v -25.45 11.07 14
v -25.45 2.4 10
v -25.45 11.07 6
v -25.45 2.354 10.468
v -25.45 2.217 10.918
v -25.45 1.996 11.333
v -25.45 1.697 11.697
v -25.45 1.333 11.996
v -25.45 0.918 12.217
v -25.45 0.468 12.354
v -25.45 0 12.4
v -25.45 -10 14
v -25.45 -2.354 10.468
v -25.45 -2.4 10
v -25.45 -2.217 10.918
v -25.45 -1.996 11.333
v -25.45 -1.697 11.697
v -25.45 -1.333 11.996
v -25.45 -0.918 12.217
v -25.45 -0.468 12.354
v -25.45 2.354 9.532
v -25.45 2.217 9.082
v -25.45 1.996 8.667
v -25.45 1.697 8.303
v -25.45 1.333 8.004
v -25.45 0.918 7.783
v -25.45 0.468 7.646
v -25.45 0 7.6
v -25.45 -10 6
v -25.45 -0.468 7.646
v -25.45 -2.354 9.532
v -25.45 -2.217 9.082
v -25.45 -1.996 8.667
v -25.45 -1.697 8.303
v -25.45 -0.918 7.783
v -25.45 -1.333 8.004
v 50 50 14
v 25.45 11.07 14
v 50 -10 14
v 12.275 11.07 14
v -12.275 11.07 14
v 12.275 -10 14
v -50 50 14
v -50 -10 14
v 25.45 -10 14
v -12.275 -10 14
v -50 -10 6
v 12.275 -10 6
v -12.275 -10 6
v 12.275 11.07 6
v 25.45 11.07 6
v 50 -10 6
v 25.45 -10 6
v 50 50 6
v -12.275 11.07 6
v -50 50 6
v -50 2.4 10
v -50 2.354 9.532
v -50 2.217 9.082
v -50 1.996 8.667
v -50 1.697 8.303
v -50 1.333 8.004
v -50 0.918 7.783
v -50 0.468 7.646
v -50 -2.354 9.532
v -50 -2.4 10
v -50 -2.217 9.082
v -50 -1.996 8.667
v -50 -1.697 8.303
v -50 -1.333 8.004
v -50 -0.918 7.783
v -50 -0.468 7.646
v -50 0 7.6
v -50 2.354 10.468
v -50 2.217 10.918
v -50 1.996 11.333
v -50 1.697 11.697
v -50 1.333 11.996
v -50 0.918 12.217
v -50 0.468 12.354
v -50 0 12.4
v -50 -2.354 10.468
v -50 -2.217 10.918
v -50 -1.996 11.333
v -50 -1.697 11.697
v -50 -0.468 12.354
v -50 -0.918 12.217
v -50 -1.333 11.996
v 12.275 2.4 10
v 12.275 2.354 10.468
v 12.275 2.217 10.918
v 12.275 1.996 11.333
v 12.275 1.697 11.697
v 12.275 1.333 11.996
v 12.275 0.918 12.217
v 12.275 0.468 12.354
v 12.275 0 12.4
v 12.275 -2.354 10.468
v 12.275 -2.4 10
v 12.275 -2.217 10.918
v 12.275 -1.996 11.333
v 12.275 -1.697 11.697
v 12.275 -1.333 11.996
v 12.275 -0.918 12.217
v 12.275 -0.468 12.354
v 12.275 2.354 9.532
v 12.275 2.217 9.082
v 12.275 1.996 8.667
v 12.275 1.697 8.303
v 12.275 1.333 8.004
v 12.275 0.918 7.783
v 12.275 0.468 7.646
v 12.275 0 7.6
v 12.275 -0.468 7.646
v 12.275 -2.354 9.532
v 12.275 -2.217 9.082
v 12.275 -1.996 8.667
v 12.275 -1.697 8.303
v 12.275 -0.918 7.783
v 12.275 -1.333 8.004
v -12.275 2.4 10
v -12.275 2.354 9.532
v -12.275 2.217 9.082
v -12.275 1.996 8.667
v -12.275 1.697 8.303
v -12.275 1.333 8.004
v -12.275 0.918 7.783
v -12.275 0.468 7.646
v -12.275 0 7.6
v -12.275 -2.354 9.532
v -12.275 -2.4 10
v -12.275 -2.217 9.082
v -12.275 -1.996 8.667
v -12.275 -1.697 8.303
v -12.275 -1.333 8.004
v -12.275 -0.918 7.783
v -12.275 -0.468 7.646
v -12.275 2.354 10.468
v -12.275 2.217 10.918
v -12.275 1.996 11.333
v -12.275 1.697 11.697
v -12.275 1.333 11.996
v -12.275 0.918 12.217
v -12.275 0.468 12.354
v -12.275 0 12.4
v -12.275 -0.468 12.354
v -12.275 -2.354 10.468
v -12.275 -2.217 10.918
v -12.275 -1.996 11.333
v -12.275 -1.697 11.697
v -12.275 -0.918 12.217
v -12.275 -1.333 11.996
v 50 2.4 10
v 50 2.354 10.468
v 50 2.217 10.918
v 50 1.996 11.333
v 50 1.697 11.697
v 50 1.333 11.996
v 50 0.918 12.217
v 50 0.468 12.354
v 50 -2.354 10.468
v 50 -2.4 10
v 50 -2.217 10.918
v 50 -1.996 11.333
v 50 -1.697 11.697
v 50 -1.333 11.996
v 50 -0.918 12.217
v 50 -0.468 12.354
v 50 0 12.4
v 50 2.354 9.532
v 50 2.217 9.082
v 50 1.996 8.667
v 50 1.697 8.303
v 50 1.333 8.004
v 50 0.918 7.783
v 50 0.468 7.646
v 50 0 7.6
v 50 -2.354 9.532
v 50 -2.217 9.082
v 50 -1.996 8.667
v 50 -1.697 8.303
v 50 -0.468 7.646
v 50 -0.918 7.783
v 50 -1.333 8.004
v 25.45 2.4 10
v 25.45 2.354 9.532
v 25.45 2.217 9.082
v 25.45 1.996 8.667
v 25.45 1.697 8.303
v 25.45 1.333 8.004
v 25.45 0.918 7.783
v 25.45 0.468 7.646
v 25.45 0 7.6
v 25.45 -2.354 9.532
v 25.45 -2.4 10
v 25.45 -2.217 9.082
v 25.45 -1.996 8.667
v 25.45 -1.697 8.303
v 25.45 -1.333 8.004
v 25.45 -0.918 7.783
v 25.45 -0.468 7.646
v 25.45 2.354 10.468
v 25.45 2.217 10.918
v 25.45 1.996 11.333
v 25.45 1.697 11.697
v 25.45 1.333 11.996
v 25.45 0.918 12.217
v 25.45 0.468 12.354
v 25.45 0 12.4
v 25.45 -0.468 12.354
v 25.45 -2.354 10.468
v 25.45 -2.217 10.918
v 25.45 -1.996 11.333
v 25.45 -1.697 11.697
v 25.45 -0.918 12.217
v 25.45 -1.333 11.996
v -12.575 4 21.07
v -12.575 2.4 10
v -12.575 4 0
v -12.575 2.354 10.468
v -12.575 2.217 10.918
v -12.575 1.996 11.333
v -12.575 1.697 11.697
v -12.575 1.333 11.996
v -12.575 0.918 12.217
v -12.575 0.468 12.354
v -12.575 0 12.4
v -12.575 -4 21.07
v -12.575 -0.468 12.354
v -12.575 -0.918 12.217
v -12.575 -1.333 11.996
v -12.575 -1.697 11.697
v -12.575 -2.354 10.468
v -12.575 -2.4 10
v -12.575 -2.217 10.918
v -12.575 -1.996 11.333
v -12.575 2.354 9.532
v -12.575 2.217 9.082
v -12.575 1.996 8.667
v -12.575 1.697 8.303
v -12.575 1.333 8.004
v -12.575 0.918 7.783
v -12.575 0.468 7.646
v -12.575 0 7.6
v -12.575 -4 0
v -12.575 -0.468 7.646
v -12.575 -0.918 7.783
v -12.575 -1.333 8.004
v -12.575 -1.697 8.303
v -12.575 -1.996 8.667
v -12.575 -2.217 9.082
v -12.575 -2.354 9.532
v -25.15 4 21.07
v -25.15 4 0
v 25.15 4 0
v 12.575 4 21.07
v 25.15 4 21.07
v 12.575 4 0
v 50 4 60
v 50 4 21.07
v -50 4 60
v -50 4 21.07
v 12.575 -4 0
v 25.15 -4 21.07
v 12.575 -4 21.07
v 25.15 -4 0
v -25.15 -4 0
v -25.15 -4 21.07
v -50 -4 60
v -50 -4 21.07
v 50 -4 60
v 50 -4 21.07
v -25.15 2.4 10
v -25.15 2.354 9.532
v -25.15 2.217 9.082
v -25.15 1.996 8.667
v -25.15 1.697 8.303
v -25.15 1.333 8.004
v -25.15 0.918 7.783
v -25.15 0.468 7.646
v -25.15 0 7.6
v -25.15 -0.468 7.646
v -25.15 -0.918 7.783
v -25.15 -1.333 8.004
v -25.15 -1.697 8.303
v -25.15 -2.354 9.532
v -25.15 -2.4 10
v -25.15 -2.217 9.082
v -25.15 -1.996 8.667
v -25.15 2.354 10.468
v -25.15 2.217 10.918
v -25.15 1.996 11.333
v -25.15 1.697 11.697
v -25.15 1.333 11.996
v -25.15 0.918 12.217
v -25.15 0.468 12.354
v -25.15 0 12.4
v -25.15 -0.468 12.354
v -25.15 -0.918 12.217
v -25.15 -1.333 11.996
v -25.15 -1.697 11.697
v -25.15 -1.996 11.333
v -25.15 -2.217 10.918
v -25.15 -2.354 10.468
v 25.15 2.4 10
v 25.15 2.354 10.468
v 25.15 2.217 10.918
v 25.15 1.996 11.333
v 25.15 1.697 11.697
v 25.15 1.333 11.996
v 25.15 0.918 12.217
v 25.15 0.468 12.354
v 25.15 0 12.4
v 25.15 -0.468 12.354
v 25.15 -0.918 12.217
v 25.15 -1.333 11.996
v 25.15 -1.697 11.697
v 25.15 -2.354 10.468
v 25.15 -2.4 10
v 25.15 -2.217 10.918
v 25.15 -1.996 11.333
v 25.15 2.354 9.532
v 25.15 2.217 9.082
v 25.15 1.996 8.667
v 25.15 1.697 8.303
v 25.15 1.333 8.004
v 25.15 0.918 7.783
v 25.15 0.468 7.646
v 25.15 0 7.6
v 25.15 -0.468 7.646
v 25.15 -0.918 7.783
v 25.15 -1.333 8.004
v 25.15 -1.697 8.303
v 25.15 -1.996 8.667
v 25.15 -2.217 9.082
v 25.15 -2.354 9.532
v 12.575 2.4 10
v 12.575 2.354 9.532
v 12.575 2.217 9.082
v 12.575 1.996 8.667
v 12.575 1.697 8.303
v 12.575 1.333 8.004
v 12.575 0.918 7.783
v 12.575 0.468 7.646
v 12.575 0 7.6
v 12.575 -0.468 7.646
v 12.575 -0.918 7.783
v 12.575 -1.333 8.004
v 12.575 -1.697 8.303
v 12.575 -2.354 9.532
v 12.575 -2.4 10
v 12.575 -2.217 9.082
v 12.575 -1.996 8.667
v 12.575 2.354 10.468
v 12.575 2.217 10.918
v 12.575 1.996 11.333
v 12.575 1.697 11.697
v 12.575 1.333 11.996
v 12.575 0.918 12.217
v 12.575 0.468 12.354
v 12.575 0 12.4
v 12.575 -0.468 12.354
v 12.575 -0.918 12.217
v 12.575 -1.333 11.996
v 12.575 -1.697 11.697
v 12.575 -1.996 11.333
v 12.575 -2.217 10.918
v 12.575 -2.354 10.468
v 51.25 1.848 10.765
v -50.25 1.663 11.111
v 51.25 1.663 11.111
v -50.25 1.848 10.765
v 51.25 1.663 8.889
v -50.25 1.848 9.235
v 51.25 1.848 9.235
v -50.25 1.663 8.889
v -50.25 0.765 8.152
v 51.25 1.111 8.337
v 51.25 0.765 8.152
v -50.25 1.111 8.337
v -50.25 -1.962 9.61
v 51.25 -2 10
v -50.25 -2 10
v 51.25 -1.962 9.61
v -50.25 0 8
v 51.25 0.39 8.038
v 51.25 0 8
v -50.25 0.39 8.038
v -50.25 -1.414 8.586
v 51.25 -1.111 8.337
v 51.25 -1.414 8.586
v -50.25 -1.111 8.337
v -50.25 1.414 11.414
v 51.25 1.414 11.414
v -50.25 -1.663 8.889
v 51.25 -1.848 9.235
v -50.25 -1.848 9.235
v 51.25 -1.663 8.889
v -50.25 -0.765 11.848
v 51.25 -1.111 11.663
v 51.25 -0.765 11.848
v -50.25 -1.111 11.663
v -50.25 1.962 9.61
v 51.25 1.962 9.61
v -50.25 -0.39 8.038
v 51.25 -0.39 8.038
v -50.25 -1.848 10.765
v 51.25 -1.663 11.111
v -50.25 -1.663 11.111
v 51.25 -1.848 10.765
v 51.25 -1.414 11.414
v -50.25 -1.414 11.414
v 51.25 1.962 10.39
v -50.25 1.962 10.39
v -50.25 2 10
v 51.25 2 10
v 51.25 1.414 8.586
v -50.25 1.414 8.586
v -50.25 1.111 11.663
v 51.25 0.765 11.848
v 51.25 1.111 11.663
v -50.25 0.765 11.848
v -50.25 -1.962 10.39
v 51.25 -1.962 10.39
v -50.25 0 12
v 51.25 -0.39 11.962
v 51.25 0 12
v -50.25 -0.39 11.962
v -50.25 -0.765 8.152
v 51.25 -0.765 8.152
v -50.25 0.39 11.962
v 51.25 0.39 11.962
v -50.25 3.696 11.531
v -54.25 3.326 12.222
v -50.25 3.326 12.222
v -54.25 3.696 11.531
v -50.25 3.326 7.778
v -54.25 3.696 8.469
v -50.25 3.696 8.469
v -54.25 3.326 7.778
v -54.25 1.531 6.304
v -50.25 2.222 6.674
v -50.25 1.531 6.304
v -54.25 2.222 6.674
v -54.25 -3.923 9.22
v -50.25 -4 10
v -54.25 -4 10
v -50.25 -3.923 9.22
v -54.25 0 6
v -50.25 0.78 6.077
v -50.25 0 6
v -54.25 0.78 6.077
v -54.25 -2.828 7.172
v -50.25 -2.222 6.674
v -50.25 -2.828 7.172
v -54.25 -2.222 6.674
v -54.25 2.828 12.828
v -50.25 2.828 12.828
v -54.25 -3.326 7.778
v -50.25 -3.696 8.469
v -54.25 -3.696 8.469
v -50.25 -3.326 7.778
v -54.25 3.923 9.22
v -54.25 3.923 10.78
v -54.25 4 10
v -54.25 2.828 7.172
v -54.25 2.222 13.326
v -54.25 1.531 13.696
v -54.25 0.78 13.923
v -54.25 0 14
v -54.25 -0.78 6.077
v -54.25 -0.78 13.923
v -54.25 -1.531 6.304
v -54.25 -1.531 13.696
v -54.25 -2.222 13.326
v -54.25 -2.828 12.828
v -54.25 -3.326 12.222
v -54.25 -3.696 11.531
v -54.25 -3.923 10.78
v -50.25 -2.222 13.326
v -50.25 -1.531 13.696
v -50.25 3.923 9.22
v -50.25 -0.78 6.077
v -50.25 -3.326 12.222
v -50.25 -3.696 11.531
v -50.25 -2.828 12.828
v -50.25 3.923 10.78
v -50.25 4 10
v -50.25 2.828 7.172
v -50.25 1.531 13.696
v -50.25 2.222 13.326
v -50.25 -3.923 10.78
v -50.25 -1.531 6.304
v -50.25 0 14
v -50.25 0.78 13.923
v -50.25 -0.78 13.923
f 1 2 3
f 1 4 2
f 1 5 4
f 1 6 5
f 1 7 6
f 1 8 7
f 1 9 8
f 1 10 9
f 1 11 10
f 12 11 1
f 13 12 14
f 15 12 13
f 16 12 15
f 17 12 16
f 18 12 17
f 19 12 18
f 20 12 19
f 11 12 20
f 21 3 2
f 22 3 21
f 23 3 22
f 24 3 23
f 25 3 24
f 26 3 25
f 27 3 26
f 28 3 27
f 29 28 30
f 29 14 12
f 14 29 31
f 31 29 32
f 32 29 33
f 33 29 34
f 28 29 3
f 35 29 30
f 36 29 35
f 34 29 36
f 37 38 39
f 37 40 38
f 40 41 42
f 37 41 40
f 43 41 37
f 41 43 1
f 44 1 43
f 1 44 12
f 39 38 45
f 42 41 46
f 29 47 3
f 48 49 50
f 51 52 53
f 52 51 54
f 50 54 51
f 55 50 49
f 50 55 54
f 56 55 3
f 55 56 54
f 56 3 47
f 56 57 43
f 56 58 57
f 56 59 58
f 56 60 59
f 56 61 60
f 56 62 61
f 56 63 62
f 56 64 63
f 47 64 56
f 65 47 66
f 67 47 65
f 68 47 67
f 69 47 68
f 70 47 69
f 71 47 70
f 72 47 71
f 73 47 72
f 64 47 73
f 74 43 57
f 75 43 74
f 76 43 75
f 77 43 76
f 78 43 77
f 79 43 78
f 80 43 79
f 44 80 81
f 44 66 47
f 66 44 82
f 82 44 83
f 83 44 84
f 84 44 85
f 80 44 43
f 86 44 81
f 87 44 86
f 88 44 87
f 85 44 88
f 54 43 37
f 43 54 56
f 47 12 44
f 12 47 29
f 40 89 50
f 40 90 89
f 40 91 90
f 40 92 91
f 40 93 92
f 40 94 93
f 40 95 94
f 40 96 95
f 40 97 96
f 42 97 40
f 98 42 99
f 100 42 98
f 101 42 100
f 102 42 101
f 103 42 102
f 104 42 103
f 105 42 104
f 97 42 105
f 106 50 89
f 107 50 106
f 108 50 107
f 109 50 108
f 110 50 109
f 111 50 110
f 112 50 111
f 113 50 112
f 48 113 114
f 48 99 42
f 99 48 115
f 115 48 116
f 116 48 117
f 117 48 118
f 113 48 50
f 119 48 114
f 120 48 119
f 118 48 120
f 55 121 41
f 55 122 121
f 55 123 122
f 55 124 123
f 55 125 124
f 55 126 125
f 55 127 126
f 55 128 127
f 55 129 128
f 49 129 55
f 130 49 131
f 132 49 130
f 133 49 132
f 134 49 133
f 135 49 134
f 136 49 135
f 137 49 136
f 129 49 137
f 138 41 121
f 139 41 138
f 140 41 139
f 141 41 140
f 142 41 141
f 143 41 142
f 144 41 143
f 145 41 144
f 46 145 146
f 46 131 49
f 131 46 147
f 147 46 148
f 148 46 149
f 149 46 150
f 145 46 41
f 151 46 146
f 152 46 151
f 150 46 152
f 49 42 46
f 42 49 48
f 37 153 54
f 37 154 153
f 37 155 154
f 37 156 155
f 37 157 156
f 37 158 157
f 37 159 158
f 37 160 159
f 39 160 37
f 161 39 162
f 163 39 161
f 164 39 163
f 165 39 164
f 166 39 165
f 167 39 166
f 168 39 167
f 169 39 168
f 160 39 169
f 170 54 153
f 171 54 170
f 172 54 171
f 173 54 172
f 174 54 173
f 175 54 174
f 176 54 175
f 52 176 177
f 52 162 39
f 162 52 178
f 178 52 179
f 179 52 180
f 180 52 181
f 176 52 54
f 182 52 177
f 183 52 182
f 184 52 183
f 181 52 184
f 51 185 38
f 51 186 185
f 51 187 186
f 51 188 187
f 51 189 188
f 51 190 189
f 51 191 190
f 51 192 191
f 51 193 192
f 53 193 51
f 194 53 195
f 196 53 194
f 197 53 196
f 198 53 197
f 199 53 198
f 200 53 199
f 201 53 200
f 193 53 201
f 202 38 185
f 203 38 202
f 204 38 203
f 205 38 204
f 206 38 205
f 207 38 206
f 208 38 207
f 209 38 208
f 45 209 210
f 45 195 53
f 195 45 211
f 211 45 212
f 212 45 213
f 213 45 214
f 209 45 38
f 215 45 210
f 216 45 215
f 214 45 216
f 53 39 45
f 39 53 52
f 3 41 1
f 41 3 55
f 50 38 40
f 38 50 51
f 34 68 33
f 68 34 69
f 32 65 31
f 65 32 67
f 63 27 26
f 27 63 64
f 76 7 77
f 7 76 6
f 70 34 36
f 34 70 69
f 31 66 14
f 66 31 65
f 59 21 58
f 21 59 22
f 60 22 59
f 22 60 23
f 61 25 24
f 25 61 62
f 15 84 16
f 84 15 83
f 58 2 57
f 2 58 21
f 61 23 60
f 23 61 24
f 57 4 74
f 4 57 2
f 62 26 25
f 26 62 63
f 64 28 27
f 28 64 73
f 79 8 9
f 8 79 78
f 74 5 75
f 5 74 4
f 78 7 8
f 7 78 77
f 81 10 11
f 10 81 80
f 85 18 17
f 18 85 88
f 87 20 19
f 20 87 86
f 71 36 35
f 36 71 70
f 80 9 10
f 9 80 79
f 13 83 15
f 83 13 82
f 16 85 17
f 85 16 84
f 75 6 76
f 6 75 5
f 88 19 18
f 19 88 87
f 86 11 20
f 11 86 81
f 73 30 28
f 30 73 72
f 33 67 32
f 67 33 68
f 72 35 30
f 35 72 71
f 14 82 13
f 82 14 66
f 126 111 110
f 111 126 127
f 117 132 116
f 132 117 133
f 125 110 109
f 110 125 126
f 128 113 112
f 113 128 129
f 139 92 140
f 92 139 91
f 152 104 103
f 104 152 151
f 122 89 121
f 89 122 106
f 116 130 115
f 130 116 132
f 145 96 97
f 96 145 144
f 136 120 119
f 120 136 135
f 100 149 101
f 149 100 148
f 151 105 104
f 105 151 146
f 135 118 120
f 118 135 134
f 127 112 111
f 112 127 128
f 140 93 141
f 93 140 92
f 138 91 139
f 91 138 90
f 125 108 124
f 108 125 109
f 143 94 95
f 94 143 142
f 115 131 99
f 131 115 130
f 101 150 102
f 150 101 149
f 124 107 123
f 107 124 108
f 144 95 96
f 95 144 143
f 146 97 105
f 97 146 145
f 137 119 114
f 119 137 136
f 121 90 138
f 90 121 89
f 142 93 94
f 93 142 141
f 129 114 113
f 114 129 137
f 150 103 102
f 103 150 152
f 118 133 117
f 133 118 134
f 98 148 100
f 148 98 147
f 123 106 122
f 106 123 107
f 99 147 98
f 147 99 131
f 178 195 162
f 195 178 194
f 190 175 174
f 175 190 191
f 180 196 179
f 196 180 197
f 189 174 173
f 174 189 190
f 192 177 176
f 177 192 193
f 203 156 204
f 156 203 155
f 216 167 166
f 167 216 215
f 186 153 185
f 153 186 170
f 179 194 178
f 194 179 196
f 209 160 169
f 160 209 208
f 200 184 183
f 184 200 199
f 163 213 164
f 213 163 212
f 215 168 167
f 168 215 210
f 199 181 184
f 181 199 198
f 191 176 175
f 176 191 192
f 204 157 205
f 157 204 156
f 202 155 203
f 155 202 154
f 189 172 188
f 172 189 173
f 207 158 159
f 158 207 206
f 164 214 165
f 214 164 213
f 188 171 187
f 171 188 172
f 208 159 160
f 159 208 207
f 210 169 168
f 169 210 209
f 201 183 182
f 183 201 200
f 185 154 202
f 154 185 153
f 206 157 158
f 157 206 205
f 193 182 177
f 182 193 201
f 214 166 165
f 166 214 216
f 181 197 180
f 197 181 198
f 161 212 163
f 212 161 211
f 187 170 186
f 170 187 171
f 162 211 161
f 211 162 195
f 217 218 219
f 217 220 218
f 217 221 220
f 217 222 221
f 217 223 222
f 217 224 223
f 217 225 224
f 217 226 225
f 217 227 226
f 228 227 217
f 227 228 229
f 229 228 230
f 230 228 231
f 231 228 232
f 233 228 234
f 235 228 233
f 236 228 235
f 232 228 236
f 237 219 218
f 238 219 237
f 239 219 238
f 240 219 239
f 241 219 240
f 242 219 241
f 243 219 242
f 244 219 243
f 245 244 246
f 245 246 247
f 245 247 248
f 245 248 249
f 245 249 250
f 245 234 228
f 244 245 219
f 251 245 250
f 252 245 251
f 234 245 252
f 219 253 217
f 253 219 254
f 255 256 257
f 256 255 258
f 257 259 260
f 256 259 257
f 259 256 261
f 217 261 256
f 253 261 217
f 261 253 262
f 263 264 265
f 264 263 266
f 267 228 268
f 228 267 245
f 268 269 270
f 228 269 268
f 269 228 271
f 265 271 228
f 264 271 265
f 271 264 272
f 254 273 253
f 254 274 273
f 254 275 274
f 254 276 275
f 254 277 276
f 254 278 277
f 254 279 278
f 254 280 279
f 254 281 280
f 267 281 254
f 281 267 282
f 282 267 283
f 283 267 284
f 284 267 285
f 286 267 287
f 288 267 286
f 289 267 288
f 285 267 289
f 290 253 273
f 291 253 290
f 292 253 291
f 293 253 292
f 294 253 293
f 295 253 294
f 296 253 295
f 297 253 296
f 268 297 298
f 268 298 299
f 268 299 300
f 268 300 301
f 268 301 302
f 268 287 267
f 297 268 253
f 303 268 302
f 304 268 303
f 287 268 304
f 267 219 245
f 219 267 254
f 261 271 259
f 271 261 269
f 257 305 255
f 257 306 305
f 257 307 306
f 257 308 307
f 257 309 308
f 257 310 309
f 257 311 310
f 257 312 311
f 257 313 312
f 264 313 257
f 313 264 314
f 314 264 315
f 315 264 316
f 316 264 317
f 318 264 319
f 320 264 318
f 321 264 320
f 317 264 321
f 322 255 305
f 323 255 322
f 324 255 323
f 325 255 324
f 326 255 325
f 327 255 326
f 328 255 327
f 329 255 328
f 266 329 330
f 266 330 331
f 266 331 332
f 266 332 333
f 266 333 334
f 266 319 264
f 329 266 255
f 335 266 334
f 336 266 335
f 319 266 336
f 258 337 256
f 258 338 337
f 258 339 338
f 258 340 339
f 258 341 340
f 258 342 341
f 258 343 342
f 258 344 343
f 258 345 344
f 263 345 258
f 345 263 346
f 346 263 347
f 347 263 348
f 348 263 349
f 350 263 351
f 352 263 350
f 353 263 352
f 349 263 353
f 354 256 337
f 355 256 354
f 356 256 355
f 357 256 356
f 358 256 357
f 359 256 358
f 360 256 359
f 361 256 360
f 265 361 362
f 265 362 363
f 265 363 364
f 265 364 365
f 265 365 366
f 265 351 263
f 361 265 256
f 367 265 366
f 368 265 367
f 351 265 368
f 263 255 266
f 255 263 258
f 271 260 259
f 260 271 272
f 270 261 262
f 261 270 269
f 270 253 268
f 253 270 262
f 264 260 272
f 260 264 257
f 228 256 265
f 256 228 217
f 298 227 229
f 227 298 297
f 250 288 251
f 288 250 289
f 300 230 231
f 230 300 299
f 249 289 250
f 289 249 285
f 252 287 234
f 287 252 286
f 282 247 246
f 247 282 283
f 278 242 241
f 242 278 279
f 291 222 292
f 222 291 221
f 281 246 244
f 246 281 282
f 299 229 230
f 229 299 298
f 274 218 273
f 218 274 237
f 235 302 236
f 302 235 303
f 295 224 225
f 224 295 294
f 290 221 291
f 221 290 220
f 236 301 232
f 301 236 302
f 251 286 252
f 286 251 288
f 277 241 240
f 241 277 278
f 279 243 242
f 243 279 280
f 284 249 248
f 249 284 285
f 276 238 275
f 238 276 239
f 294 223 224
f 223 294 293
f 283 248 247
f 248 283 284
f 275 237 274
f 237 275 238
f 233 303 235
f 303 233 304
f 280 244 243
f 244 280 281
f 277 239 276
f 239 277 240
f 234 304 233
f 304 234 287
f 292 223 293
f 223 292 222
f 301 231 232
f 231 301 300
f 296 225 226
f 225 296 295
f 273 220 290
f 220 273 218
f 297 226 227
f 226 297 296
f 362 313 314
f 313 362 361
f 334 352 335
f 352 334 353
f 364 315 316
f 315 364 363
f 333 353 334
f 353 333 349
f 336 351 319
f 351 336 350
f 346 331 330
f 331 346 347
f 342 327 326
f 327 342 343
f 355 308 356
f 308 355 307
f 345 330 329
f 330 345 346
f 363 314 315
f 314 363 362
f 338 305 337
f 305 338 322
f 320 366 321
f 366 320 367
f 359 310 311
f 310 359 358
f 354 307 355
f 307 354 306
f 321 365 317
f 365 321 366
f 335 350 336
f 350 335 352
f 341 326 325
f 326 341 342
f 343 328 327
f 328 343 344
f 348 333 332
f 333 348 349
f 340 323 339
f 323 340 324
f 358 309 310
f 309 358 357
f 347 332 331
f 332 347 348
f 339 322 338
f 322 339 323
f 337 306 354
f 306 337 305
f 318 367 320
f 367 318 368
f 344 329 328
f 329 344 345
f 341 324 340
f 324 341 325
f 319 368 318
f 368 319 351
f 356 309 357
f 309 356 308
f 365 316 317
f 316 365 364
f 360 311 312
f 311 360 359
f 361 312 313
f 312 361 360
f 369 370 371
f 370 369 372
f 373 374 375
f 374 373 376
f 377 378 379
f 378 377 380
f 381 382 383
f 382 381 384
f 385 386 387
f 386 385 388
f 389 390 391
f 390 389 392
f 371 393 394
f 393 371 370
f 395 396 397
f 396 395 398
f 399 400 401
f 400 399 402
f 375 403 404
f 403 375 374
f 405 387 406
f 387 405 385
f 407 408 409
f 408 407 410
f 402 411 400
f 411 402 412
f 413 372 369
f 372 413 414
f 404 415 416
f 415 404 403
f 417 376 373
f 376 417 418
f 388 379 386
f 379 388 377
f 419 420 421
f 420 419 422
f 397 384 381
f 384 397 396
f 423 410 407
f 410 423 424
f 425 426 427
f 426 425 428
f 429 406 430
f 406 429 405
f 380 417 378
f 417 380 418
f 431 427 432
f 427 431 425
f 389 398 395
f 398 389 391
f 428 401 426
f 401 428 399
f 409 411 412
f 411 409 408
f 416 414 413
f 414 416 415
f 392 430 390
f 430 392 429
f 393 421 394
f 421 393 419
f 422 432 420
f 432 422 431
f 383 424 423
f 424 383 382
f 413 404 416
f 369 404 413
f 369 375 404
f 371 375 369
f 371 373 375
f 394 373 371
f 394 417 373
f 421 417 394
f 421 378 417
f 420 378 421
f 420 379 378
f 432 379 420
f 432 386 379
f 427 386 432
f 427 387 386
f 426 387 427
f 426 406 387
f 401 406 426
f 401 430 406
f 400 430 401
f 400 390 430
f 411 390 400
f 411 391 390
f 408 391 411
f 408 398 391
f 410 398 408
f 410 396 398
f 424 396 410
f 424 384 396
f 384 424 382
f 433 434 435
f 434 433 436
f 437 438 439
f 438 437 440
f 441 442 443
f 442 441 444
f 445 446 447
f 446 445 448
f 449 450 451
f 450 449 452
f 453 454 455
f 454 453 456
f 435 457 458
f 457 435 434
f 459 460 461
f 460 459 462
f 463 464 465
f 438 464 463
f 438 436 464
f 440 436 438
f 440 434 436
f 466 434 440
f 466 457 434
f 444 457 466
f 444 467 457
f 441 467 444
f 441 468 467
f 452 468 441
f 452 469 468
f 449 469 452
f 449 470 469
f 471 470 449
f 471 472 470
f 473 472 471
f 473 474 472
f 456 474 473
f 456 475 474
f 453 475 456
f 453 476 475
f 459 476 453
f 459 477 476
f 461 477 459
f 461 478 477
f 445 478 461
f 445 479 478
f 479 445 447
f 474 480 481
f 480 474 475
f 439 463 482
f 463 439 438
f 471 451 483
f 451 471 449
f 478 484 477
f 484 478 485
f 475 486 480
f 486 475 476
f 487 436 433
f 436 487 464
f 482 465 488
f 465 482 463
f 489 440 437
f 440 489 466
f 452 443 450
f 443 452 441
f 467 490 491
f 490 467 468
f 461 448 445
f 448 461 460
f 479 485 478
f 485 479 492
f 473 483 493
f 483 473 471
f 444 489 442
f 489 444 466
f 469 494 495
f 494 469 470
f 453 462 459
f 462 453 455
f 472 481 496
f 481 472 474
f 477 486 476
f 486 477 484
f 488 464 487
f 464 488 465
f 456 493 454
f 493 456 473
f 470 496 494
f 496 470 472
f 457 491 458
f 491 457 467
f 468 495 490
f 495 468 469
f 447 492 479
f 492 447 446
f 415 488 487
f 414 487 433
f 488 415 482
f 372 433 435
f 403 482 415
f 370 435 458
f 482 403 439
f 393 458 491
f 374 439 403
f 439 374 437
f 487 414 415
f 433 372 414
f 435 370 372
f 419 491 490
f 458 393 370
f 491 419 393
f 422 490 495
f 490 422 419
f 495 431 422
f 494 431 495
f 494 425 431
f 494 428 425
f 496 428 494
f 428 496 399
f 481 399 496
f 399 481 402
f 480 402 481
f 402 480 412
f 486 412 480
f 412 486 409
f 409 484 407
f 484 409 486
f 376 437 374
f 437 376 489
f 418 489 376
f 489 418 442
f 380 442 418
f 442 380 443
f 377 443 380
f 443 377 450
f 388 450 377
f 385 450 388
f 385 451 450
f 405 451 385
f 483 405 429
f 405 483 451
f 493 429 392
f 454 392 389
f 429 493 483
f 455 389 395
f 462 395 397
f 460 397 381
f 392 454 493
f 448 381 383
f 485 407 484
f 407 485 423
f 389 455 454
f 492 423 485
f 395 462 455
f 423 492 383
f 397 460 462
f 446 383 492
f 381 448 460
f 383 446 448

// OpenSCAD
$fn = 32;

// ------------------------------------------------------------------------
// Butt hinge: hinge 100 mm, leaf swung 270 deg
// Every part is its own module, assembly() places every instance.
// ------------------------------------------------------------------------

// --- part 1 ---
module hinge_base() {
  difference() {
    union() {
      translate([-50, -10, -4]) cube([24.55, 60, 8]);
      translate([-12.275, -10, -4]) cube([24.55, 60, 8]);
      translate([25.45, -10, -4]) cube([24.55, 60, 8]);
      translate([-50, 11.07, -4]) cube([100, 38.93, 8]);
    }
    translate([-37.725, 0, 0]) rotate([0, 90, 0]) cylinder(h = 26.55, d = 4.8, center = true);
    translate([0, 0, 0]) rotate([0, 90, 0]) cylinder(h = 26.55, d = 4.8, center = true);
    translate([37.725, 0, 0]) rotate([0, 90, 0]) cylinder(h = 26.55, d = 4.8, center = true);
  }
}

// --- part 2 ---
module hinge_mover() {
  difference() {
    union() {
      translate([-25.15, -50, -4]) cube([12.575, 60, 8]);
      translate([12.575, -50, -4]) cube([12.575, 60, 8]);
      translate([-50, -50, -4]) cube([100, 38.93, 8]);
    }
    translate([-18.863, 0, 0]) rotate([0, 90, 0]) cylinder(h = 14.575, d = 4.8, center = true);
    translate([18.863, 0, 0]) rotate([0, 90, 0]) cylinder(h = 14.575, d = 4.8, center = true);
  }
}

// --- part 3 ---
module hinge_pin() {
  rotate([0, 90, 0]) cylinder(h = 102.5, d = 4, center = true);
  translate([-54.25, 0, 0]) rotate([0, 90, 0]) cylinder(h = 4, d = 8);
}

// --- assembly ---
module assembly() {
  color([0.80, 0.24, 0.20]) translate([0, 0, 10]) rotate([0, 0, 0]) hinge_base();
  color([0.20, 0.45, 0.75]) translate([0, 0, 10]) rotate([270, 0, 0]) hinge_mover();
  color([0.25, 0.62, 0.32]) translate([0, 0, 10]) rotate([0, 0, 0]) hinge_pin();
}

assembly();
